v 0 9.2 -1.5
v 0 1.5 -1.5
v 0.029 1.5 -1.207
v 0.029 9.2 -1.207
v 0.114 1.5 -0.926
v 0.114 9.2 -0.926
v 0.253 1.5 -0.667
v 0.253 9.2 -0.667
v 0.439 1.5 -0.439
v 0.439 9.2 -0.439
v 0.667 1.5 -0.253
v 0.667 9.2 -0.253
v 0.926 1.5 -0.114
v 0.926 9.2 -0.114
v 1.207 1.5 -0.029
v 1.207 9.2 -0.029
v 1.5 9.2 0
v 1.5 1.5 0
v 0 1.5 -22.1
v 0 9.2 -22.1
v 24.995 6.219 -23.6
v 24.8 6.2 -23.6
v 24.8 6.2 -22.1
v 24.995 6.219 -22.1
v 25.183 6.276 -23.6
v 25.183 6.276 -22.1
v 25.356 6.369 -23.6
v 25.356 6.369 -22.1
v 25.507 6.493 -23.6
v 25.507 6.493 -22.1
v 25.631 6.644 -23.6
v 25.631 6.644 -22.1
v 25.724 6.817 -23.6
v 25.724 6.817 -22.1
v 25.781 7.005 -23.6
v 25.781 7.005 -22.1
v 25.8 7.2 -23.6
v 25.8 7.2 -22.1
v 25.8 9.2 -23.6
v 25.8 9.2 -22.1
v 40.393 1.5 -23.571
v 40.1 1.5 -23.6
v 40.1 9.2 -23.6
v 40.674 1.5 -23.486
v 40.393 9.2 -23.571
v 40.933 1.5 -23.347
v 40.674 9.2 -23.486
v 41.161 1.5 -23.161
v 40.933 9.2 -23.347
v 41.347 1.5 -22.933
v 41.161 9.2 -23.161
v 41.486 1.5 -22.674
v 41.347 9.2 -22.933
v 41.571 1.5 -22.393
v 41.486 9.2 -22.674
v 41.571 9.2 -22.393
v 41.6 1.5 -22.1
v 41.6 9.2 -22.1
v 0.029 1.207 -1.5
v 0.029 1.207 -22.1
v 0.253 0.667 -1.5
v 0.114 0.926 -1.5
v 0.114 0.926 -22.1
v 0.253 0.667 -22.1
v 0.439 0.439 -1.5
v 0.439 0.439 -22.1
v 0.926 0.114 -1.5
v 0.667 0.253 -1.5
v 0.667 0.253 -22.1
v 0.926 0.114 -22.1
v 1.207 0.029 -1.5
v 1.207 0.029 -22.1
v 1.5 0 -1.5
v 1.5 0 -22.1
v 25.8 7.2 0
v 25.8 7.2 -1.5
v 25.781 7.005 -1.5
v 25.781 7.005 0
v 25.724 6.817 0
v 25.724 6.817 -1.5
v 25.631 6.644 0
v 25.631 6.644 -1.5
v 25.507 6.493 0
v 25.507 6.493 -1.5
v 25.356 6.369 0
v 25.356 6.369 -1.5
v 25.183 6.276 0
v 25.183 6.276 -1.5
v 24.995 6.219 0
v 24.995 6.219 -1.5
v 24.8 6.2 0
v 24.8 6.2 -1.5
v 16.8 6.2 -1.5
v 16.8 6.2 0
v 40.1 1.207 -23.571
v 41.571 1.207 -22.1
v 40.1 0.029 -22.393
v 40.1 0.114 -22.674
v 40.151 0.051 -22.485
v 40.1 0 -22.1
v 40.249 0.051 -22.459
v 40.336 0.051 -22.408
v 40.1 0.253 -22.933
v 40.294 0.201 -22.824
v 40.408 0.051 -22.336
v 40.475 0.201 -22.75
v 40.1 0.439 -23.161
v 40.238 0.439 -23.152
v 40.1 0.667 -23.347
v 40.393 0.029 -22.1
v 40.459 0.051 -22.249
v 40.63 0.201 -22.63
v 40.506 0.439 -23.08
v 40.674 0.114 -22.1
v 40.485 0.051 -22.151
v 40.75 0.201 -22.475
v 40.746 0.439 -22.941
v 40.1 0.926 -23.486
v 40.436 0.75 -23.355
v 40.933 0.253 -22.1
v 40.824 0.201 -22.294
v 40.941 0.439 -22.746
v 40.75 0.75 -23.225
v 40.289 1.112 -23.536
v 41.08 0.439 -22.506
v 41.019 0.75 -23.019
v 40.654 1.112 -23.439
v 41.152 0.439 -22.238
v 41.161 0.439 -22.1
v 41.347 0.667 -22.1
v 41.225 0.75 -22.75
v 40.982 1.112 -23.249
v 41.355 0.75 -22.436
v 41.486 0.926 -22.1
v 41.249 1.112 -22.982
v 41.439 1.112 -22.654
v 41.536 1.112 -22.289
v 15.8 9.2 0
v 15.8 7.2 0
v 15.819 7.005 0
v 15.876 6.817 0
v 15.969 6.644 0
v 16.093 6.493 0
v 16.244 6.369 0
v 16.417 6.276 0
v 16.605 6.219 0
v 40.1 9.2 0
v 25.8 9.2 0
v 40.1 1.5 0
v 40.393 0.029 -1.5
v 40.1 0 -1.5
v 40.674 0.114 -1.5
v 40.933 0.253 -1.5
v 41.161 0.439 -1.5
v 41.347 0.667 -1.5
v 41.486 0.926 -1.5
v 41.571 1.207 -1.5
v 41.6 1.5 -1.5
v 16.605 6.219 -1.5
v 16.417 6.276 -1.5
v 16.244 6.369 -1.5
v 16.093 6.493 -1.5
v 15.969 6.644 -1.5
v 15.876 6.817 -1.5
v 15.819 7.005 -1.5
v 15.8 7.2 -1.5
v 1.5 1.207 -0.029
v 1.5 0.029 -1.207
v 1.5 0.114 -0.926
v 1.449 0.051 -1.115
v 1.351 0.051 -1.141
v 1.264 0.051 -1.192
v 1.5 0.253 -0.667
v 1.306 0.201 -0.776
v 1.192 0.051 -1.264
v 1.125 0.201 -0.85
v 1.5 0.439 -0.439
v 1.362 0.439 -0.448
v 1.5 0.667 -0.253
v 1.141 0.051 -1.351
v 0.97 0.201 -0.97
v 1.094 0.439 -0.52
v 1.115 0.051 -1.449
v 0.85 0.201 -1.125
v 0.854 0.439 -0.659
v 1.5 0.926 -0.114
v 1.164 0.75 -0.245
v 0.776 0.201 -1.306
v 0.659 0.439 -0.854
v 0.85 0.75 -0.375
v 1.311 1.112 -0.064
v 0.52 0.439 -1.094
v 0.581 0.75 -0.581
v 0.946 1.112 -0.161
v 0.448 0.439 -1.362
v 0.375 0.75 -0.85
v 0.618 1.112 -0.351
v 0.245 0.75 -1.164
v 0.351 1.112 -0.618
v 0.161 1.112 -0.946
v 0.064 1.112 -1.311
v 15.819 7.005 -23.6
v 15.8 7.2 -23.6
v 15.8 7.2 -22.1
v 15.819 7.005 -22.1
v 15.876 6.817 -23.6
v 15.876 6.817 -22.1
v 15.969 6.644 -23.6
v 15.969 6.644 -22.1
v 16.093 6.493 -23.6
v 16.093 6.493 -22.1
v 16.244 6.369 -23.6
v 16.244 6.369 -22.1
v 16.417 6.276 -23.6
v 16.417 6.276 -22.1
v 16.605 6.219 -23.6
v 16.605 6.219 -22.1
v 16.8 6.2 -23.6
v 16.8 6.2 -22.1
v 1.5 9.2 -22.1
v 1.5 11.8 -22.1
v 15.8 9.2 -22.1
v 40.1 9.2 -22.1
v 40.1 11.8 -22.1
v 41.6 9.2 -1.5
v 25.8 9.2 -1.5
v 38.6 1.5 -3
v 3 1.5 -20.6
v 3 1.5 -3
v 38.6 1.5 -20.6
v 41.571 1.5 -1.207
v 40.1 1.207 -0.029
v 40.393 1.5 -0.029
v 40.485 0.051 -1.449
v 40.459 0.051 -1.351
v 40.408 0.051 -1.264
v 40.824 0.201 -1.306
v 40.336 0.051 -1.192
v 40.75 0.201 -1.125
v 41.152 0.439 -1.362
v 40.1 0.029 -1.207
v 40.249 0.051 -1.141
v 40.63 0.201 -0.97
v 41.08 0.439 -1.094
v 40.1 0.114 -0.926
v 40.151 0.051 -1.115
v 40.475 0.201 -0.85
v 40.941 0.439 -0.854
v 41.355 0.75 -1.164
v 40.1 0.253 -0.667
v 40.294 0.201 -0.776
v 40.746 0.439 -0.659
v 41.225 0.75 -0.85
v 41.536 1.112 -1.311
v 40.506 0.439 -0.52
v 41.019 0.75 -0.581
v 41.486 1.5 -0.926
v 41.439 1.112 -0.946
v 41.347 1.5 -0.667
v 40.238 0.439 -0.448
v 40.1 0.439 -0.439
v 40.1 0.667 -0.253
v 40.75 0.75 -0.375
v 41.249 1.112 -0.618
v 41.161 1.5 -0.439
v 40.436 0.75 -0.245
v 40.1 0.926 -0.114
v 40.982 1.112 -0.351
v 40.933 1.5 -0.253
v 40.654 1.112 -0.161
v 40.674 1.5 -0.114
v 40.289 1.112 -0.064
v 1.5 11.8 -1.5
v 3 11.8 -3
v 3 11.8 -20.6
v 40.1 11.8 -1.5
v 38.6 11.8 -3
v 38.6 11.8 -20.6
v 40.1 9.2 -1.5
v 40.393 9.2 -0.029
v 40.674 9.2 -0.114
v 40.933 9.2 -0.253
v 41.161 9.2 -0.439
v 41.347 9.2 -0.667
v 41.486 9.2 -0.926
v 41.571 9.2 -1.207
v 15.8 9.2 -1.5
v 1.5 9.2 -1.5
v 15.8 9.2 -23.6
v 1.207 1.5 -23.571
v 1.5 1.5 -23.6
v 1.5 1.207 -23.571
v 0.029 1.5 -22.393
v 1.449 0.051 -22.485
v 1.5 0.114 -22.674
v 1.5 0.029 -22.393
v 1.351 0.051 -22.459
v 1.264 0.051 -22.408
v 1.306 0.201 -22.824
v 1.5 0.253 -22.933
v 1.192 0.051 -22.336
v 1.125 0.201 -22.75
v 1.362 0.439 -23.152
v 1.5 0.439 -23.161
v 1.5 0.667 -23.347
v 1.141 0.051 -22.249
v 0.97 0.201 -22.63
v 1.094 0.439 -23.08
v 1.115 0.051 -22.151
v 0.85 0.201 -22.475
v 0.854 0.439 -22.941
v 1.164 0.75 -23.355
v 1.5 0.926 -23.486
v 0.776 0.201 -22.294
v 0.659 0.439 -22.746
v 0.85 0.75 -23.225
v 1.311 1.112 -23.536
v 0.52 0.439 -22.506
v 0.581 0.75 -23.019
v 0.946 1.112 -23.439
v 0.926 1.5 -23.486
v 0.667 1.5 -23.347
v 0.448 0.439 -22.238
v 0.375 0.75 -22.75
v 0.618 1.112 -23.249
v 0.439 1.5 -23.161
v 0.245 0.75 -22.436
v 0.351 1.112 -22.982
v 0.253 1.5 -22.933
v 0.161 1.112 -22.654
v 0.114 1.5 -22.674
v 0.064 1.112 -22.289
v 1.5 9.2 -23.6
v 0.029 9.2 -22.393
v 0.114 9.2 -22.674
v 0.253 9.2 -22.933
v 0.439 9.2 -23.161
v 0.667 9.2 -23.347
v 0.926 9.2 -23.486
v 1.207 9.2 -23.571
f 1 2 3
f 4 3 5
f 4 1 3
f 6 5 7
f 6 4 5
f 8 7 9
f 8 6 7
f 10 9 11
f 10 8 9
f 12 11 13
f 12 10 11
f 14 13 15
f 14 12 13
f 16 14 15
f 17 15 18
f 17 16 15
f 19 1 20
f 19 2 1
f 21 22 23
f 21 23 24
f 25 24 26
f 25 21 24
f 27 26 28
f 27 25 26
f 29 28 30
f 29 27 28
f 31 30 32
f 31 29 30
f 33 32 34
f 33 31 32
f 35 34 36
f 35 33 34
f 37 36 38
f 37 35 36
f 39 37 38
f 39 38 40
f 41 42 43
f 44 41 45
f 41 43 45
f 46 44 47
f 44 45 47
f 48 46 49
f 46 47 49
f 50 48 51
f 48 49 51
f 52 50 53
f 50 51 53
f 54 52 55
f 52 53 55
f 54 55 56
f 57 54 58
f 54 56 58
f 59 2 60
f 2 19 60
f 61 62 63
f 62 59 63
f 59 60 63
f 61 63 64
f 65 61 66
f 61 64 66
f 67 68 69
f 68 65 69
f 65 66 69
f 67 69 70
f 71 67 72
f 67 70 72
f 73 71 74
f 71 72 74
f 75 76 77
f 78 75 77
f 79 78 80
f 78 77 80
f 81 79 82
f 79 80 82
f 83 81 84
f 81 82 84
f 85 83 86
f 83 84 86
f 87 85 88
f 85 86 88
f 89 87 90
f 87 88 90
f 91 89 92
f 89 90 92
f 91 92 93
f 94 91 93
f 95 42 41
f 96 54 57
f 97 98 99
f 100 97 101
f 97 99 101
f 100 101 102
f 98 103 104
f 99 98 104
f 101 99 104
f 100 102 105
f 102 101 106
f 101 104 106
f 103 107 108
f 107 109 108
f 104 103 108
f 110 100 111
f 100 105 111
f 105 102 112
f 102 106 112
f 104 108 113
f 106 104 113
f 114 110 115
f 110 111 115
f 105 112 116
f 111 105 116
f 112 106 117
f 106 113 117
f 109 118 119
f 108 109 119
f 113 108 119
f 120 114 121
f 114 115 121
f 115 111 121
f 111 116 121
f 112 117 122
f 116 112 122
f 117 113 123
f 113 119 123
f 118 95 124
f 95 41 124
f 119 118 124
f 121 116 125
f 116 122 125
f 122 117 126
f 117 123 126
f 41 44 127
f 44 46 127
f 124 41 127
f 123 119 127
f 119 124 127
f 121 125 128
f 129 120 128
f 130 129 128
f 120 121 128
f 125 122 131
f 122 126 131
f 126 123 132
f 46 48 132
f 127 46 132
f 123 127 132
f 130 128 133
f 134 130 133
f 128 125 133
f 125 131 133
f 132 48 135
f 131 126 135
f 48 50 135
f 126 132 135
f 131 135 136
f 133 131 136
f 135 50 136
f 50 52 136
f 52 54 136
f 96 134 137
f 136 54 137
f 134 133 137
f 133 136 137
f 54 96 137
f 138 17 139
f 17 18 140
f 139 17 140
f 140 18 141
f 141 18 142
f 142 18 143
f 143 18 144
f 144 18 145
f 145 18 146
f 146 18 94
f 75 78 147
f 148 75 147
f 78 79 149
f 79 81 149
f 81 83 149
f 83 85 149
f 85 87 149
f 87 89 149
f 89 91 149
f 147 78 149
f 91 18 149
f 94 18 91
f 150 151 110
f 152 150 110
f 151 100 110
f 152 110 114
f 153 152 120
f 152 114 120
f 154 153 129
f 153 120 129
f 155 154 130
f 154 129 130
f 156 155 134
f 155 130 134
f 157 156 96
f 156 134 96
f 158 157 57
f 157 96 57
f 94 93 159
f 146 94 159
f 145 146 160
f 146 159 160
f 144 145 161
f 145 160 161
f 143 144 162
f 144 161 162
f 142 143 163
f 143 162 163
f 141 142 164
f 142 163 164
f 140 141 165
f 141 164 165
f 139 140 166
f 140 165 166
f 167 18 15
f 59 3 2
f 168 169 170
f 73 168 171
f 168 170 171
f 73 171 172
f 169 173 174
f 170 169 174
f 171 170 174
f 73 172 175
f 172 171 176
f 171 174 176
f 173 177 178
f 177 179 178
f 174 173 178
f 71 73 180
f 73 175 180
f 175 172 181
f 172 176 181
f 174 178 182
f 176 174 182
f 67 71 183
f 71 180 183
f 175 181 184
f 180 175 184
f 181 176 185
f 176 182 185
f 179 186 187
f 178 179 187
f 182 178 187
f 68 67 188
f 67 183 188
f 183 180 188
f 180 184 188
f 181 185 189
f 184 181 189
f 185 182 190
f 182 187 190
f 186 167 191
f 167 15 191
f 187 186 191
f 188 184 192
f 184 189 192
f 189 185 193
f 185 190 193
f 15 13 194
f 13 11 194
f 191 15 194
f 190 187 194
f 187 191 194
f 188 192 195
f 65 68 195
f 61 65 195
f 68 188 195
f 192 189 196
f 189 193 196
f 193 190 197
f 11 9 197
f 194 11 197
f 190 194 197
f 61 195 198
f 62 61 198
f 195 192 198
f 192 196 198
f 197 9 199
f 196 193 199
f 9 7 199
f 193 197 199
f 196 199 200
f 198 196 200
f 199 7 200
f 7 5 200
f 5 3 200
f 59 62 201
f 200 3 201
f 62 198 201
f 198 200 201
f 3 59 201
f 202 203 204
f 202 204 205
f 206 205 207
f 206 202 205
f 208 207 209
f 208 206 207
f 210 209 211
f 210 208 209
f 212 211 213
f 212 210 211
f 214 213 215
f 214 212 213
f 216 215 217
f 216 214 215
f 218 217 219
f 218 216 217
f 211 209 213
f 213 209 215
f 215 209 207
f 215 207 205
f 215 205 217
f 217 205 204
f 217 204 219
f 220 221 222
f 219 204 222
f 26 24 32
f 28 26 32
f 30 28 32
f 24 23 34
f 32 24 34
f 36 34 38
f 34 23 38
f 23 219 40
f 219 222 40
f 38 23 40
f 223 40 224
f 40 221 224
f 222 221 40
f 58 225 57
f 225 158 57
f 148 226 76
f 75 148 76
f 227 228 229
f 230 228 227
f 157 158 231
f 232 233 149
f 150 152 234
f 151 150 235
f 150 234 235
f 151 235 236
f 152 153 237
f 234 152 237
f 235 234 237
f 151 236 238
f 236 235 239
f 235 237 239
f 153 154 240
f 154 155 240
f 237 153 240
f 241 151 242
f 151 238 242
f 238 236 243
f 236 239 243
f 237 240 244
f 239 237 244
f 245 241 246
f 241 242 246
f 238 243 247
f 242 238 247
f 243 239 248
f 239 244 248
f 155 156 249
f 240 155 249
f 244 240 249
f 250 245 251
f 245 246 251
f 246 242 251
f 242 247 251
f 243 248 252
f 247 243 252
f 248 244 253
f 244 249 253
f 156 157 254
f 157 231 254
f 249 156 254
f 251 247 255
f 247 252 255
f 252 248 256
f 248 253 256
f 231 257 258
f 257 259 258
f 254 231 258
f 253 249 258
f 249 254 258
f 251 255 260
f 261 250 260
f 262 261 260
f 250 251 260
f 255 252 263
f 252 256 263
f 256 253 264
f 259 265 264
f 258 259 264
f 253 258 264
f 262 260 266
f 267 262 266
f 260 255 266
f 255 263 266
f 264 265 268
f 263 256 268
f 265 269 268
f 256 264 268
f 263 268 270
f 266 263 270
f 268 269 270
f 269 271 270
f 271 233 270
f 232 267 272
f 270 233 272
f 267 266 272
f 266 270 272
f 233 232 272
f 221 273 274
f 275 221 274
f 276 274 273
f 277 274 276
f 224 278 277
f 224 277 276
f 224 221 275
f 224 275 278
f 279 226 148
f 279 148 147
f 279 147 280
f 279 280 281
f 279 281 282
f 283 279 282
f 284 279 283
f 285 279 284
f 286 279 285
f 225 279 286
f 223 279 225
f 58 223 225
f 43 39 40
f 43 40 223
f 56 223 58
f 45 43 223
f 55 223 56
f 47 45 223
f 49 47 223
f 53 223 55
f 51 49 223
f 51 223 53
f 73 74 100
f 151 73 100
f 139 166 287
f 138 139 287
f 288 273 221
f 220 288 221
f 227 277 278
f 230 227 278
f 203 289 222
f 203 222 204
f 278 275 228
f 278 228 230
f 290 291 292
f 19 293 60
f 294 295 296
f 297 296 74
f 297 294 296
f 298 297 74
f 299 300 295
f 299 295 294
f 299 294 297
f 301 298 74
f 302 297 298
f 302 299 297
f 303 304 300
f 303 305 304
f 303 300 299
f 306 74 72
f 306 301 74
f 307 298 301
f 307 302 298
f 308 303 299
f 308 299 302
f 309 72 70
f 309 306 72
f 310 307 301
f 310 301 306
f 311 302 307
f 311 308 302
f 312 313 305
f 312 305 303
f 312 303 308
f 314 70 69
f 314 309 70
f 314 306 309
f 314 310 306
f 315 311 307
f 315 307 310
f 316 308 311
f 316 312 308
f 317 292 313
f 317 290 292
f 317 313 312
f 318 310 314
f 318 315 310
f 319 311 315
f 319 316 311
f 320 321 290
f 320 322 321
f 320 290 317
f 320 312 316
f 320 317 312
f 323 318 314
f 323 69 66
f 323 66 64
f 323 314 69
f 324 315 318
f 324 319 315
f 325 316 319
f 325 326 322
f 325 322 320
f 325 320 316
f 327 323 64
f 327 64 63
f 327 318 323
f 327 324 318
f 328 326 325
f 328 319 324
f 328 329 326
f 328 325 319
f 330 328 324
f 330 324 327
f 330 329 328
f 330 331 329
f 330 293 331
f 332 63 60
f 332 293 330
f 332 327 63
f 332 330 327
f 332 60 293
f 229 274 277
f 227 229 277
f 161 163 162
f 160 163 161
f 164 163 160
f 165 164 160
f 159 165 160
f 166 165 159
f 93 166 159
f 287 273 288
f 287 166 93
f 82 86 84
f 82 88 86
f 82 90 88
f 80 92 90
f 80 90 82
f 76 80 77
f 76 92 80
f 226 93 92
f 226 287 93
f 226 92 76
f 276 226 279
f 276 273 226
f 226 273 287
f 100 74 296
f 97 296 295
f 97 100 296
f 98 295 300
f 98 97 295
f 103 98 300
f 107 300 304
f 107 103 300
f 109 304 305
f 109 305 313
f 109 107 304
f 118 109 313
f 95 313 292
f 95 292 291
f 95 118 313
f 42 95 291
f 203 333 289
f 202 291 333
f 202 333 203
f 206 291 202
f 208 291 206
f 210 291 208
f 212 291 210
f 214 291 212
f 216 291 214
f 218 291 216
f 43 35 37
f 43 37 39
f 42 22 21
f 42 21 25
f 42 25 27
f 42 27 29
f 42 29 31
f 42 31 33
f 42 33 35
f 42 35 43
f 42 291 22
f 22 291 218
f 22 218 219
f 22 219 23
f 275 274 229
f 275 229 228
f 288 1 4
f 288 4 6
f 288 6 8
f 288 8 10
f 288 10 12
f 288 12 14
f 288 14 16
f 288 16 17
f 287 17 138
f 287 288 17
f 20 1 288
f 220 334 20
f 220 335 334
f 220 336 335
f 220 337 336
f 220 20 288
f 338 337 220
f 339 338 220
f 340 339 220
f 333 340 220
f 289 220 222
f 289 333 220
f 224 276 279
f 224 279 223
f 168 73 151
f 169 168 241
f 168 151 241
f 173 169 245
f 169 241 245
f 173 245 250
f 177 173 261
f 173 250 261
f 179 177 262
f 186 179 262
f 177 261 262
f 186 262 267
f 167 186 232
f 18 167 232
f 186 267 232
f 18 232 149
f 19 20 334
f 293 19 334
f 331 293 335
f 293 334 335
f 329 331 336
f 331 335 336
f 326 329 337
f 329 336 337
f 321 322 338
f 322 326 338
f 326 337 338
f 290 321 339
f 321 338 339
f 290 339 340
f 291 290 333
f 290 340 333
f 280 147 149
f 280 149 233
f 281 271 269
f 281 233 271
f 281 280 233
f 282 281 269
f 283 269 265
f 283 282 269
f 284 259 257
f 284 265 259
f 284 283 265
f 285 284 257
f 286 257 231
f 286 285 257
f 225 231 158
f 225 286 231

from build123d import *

# Parameters (mm, degrees)
SKETCH1_W           = 41.6
SKETCH1_H           = 23.6
BOSS_EXTRUDE1_DEPTH = 11.8
SKETCH2_W           = 35.6
SKETCH2_H           = 17.6
CUT_EXTRUDE1_DEPTH  = 10.3
SKETCH4_W           = 41.6
SKETCH4_H           = 23.6
SKETCH4_W_2         = 38.6
SKETCH4_H_2         = 20.6
CUT_EXTRUDE2_DEPTH  = 2.6
FILLET1_R           = 1.5
CUT_EXTRUDE3_DEPTH  = 1.5
CUT_EXTRUDE4_START  = -1.5
CUT_EXTRUDE4_DEPTH  = 1.5


with BuildPart() as part:
    # Sketch1 → Boss-Extrude1 (new body)
    with BuildSketch(Plane(origin=(0, 0, 0), x_dir=(1, 0, 0), z_dir=(0, 1, 0))):
        with Locations((20.8, 11.8)):
            Rectangle(SKETCH1_W, SKETCH1_H)
    extrude(amount=BOSS_EXTRUDE1_DEPTH)

    # Sketch2 → Cut-Extrude1 (cut)
    with BuildSketch(Plane(origin=(0, 11.8, 0), x_dir=(1, 0, 0), z_dir=(0, 1, 0))):
        with Locations((20.8, 11.8)):
            Rectangle(SKETCH2_W, SKETCH2_H)
    extrude(amount=-CUT_EXTRUDE1_DEPTH, mode=Mode.SUBTRACT)

    # Sketch4 → Cut-Extrude2 (cut)
    with BuildSketch(Plane(origin=(0, 11.8, 0), x_dir=(1, 0, 0), z_dir=(0, 1, 0))):
        with Locations((20.8, 11.8)):
            Rectangle(SKETCH4_W, SKETCH4_H)
        with Locations((20.8, 11.8)):
            Rectangle(SKETCH4_W_2, SKETCH4_H_2, mode=Mode.SUBTRACT)
    extrude(amount=-CUT_EXTRUDE2_DEPTH, mode=Mode.SUBTRACT)

    # Fillet1
    fillet1_edges = [part.edges().sort_by_distance(p)[0] for p in [
        (0, 4.6, -23.6),
        (41.6, 4.6, -23.6),
        (41.6, 4.6, 0),
        (0, 4.6, 0),
        (20.8, 0, -23.6),
        (41.6, 0, -11.8),
        (20.8, 0, 0),
        (0, 0, -11.8),
    ]]
    fillet(fillet1_edges, radius=FILLET1_R)

    # Sketch5 → Cut-Extrude3 (cut)
    with BuildSketch(Plane(origin=(0, 0, -23.6), x_dir=(-1, 0, 0), z_dir=(0, 0, -1))):
        with BuildLine():
            Line((-25.8, 9.2), (-15.8, 9.2))
            Line((-15.8, 9.2), (-15.8, 7.2))
            ThreePointArc((-15.8, 7.2), (-16.092893219, 6.492893219), (-16.8, 6.2))
            Line((-16.8, 6.2), (-24.8, 6.2))
            ThreePointArc((-24.8, 6.2), (-25.507106781, 6.492893219), (-25.8, 7.2))
            Line((-25.8, 7.2), (-25.8, 9.2))
        make_face()
    extrude(amount=-CUT_EXTRUDE3_DEPTH, mode=Mode.SUBTRACT)

    # Sketch6 → Cut-Extrude4 (cut)
    with BuildSketch(Plane.XY.offset(CUT_EXTRUDE4_START)):
        with BuildLine():
            Line((15.8, 9.2), (25.8, 9.2))
            Line((25.8, 9.2), (25.8, 7.2))
            ThreePointArc((25.8, 7.2), (25.507106781, 6.492893219), (24.8, 6.2))
            Line((24.8, 6.2), (16.8, 6.2))
            ThreePointArc((16.8, 6.2), (16.092893219, 6.492893219), (15.8, 7.2))
            Line((15.8, 7.2), (15.8, 9.2))
        make_face()
    extrude(amount=CUT_EXTRUDE4_DEPTH, mode=Mode.SUBTRACT)


solid = part.part
